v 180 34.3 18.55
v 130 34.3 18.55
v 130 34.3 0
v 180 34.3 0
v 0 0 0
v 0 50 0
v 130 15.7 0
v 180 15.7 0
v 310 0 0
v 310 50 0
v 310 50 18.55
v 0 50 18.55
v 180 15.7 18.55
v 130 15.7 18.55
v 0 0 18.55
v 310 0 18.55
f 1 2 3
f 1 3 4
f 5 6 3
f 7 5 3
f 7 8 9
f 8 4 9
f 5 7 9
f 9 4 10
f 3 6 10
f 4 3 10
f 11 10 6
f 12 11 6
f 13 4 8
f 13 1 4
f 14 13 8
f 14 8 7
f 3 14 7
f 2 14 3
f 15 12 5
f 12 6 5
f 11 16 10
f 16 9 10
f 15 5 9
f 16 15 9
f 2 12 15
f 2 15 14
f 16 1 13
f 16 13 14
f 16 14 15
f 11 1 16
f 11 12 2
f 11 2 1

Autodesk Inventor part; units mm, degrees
ref_plane "YZ Plane" through (0, 0, 0) normal (1, 0, 0) x (0, 1, 0)
ref_plane "XZ Plane" through (0, 0, 0) normal (0, 1, 0) x (-1, 0, 0)
ref_plane "XY Plane" through (0, 0, 0) normal (0, 0, 1) x (1, 0, 0)
sketch "Sketch1" plane through (0, 0, 0) normal (0, 0, 1) x (1, 0, 0)
  line L0 (0, 0) -> (310, 0)
  line L1 (310, 0) -> (310, 50)
  line L2 (310, 50) -> (0, 50)
  line L3 (0, 50) -> (0, 0)
  dimension "d0" = 310
  dimension "d1" = 50
extrude "Extrusion1" add sketch "Sketch1" along normal blind 18.55
sketch "Sketch2" plane through (0, 0, 18.55) normal (0, 0, 1) x (1, 0, 0)
  line L0 (130, 34.3) -> (180, 34.3)
  line L1 (180, 34.3) -> (180, 15.7)
  line L2 (180, 15.7) -> (130, 15.7)
  line L3 (130, 15.7) -> (130, 34.3)
  line L4 (130, 25) -> (0, 25) construction
  line L5 (0, 50) -> (0, 0) projected
  line L6 (180, 25) -> (310, 25) construction
  line L7 (310, 0) -> (310, 50) projected
  dimension "d4" = 18.6
  dimension "d5" = 50
extrude "Extrusion2" cut sketch "Sketch2" against normal blind 20
properties part number "mobile_table_bottom"
